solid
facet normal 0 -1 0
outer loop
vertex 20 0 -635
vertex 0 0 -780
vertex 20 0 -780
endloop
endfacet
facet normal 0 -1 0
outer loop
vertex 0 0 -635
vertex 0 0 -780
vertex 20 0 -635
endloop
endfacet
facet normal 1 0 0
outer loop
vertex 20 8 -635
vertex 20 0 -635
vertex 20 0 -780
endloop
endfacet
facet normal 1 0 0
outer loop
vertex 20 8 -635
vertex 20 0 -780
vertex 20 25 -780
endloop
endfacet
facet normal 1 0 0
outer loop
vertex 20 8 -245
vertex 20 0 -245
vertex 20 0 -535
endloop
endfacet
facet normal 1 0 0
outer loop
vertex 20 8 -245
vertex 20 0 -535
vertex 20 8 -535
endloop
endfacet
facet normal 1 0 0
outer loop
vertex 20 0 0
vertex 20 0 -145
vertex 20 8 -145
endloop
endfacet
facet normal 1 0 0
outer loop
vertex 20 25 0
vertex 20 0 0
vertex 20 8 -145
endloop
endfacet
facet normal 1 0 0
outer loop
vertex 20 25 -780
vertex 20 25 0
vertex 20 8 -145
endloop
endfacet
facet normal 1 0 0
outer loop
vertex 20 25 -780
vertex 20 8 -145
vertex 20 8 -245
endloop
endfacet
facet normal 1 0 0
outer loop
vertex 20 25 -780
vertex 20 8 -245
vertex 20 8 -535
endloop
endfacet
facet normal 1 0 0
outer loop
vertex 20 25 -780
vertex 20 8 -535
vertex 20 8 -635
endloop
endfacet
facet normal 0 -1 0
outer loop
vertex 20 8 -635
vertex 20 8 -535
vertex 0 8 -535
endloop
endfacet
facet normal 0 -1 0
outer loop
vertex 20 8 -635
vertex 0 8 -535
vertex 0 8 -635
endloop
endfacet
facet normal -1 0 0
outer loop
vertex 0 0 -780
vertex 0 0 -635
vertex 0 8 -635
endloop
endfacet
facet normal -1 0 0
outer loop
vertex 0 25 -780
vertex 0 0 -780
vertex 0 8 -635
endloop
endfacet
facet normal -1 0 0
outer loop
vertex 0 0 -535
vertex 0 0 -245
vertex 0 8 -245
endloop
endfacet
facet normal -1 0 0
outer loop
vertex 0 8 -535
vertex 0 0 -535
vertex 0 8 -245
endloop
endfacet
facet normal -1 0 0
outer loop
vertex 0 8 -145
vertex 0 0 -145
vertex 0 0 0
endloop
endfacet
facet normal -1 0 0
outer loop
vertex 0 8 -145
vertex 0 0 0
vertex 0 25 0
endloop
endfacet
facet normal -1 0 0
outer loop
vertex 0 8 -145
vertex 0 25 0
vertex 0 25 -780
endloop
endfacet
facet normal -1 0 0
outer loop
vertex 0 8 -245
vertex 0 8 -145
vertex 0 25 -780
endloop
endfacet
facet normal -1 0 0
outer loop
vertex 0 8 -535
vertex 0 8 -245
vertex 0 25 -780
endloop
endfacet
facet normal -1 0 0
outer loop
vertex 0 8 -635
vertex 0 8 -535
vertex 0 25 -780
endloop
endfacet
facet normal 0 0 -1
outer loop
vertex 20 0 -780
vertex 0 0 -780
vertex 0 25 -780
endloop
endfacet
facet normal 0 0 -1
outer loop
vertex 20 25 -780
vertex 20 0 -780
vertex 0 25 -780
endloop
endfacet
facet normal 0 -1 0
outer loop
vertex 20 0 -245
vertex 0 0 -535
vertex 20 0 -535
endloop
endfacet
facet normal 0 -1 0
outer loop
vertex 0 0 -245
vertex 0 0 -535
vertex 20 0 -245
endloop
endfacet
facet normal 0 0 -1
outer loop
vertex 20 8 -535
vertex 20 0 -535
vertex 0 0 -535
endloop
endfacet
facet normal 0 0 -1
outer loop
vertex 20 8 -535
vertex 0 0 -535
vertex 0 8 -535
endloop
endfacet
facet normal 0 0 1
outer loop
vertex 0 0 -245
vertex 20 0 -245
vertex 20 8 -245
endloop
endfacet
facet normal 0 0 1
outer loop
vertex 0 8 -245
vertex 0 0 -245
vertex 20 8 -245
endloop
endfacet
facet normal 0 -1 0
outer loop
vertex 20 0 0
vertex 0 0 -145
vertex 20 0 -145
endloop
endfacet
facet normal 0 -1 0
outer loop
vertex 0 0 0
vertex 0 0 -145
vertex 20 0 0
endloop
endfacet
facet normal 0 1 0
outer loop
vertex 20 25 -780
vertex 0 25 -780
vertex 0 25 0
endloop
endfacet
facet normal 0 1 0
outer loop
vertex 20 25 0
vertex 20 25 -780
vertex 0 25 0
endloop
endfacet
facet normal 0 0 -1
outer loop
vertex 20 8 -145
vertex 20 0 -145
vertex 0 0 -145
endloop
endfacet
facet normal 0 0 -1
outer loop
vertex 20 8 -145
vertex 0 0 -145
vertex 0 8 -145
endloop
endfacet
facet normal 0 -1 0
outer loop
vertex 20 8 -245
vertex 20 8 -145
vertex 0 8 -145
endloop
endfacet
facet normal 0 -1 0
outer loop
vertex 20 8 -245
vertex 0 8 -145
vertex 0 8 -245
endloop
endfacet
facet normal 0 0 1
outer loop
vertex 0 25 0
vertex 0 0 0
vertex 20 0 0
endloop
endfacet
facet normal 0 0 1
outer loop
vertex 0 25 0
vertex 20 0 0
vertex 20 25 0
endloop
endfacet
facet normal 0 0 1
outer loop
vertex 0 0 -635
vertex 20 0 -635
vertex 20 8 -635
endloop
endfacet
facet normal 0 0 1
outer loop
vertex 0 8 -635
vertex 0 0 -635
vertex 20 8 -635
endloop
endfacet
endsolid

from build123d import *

# Parameters (mm, degrees)
EXTRUDE_1_OUTLINE_W = 25
EXTRUDE_1_OUTLINE_H = 780
EXTRUDE_1_DEPTH     = 20
SKETCH_2_W          = 100
SKETCH_2_H          = 8
CUT_EXTRUDE_1_DEPTH = 781.656774774


# Read off the part's stored shape, not the designer's step: Бобышка-Вытянуть1
with BuildPart() as part:
    # Бобышка-Вытянуть1 outline → Бобышка-Вытянуть1 (new body)
    with BuildSketch(Plane.YZ):
        with Locations((12.5, -390)):
            Rectangle(EXTRUDE_1_OUTLINE_W, EXTRUDE_1_OUTLINE_H)
    extrude(amount=EXTRUDE_1_DEPTH)

    # Эскиз2 → Вырез-Вытянуть1 (cut, through all)
    with BuildSketch(Plane(origin=(20, 0, 0), x_dir=(0, 0, -1), z_dir=(1, 0, 0))):
        with Locations((195, 4)):
            Rectangle(SKETCH_2_W, SKETCH_2_H)
        with Locations((585, 4)):
            Rectangle(SKETCH_2_W, SKETCH_2_H)
    extrude(amount=-CUT_EXTRUDE_1_DEPTH, mode=Mode.SUBTRACT)


solid = part.part
